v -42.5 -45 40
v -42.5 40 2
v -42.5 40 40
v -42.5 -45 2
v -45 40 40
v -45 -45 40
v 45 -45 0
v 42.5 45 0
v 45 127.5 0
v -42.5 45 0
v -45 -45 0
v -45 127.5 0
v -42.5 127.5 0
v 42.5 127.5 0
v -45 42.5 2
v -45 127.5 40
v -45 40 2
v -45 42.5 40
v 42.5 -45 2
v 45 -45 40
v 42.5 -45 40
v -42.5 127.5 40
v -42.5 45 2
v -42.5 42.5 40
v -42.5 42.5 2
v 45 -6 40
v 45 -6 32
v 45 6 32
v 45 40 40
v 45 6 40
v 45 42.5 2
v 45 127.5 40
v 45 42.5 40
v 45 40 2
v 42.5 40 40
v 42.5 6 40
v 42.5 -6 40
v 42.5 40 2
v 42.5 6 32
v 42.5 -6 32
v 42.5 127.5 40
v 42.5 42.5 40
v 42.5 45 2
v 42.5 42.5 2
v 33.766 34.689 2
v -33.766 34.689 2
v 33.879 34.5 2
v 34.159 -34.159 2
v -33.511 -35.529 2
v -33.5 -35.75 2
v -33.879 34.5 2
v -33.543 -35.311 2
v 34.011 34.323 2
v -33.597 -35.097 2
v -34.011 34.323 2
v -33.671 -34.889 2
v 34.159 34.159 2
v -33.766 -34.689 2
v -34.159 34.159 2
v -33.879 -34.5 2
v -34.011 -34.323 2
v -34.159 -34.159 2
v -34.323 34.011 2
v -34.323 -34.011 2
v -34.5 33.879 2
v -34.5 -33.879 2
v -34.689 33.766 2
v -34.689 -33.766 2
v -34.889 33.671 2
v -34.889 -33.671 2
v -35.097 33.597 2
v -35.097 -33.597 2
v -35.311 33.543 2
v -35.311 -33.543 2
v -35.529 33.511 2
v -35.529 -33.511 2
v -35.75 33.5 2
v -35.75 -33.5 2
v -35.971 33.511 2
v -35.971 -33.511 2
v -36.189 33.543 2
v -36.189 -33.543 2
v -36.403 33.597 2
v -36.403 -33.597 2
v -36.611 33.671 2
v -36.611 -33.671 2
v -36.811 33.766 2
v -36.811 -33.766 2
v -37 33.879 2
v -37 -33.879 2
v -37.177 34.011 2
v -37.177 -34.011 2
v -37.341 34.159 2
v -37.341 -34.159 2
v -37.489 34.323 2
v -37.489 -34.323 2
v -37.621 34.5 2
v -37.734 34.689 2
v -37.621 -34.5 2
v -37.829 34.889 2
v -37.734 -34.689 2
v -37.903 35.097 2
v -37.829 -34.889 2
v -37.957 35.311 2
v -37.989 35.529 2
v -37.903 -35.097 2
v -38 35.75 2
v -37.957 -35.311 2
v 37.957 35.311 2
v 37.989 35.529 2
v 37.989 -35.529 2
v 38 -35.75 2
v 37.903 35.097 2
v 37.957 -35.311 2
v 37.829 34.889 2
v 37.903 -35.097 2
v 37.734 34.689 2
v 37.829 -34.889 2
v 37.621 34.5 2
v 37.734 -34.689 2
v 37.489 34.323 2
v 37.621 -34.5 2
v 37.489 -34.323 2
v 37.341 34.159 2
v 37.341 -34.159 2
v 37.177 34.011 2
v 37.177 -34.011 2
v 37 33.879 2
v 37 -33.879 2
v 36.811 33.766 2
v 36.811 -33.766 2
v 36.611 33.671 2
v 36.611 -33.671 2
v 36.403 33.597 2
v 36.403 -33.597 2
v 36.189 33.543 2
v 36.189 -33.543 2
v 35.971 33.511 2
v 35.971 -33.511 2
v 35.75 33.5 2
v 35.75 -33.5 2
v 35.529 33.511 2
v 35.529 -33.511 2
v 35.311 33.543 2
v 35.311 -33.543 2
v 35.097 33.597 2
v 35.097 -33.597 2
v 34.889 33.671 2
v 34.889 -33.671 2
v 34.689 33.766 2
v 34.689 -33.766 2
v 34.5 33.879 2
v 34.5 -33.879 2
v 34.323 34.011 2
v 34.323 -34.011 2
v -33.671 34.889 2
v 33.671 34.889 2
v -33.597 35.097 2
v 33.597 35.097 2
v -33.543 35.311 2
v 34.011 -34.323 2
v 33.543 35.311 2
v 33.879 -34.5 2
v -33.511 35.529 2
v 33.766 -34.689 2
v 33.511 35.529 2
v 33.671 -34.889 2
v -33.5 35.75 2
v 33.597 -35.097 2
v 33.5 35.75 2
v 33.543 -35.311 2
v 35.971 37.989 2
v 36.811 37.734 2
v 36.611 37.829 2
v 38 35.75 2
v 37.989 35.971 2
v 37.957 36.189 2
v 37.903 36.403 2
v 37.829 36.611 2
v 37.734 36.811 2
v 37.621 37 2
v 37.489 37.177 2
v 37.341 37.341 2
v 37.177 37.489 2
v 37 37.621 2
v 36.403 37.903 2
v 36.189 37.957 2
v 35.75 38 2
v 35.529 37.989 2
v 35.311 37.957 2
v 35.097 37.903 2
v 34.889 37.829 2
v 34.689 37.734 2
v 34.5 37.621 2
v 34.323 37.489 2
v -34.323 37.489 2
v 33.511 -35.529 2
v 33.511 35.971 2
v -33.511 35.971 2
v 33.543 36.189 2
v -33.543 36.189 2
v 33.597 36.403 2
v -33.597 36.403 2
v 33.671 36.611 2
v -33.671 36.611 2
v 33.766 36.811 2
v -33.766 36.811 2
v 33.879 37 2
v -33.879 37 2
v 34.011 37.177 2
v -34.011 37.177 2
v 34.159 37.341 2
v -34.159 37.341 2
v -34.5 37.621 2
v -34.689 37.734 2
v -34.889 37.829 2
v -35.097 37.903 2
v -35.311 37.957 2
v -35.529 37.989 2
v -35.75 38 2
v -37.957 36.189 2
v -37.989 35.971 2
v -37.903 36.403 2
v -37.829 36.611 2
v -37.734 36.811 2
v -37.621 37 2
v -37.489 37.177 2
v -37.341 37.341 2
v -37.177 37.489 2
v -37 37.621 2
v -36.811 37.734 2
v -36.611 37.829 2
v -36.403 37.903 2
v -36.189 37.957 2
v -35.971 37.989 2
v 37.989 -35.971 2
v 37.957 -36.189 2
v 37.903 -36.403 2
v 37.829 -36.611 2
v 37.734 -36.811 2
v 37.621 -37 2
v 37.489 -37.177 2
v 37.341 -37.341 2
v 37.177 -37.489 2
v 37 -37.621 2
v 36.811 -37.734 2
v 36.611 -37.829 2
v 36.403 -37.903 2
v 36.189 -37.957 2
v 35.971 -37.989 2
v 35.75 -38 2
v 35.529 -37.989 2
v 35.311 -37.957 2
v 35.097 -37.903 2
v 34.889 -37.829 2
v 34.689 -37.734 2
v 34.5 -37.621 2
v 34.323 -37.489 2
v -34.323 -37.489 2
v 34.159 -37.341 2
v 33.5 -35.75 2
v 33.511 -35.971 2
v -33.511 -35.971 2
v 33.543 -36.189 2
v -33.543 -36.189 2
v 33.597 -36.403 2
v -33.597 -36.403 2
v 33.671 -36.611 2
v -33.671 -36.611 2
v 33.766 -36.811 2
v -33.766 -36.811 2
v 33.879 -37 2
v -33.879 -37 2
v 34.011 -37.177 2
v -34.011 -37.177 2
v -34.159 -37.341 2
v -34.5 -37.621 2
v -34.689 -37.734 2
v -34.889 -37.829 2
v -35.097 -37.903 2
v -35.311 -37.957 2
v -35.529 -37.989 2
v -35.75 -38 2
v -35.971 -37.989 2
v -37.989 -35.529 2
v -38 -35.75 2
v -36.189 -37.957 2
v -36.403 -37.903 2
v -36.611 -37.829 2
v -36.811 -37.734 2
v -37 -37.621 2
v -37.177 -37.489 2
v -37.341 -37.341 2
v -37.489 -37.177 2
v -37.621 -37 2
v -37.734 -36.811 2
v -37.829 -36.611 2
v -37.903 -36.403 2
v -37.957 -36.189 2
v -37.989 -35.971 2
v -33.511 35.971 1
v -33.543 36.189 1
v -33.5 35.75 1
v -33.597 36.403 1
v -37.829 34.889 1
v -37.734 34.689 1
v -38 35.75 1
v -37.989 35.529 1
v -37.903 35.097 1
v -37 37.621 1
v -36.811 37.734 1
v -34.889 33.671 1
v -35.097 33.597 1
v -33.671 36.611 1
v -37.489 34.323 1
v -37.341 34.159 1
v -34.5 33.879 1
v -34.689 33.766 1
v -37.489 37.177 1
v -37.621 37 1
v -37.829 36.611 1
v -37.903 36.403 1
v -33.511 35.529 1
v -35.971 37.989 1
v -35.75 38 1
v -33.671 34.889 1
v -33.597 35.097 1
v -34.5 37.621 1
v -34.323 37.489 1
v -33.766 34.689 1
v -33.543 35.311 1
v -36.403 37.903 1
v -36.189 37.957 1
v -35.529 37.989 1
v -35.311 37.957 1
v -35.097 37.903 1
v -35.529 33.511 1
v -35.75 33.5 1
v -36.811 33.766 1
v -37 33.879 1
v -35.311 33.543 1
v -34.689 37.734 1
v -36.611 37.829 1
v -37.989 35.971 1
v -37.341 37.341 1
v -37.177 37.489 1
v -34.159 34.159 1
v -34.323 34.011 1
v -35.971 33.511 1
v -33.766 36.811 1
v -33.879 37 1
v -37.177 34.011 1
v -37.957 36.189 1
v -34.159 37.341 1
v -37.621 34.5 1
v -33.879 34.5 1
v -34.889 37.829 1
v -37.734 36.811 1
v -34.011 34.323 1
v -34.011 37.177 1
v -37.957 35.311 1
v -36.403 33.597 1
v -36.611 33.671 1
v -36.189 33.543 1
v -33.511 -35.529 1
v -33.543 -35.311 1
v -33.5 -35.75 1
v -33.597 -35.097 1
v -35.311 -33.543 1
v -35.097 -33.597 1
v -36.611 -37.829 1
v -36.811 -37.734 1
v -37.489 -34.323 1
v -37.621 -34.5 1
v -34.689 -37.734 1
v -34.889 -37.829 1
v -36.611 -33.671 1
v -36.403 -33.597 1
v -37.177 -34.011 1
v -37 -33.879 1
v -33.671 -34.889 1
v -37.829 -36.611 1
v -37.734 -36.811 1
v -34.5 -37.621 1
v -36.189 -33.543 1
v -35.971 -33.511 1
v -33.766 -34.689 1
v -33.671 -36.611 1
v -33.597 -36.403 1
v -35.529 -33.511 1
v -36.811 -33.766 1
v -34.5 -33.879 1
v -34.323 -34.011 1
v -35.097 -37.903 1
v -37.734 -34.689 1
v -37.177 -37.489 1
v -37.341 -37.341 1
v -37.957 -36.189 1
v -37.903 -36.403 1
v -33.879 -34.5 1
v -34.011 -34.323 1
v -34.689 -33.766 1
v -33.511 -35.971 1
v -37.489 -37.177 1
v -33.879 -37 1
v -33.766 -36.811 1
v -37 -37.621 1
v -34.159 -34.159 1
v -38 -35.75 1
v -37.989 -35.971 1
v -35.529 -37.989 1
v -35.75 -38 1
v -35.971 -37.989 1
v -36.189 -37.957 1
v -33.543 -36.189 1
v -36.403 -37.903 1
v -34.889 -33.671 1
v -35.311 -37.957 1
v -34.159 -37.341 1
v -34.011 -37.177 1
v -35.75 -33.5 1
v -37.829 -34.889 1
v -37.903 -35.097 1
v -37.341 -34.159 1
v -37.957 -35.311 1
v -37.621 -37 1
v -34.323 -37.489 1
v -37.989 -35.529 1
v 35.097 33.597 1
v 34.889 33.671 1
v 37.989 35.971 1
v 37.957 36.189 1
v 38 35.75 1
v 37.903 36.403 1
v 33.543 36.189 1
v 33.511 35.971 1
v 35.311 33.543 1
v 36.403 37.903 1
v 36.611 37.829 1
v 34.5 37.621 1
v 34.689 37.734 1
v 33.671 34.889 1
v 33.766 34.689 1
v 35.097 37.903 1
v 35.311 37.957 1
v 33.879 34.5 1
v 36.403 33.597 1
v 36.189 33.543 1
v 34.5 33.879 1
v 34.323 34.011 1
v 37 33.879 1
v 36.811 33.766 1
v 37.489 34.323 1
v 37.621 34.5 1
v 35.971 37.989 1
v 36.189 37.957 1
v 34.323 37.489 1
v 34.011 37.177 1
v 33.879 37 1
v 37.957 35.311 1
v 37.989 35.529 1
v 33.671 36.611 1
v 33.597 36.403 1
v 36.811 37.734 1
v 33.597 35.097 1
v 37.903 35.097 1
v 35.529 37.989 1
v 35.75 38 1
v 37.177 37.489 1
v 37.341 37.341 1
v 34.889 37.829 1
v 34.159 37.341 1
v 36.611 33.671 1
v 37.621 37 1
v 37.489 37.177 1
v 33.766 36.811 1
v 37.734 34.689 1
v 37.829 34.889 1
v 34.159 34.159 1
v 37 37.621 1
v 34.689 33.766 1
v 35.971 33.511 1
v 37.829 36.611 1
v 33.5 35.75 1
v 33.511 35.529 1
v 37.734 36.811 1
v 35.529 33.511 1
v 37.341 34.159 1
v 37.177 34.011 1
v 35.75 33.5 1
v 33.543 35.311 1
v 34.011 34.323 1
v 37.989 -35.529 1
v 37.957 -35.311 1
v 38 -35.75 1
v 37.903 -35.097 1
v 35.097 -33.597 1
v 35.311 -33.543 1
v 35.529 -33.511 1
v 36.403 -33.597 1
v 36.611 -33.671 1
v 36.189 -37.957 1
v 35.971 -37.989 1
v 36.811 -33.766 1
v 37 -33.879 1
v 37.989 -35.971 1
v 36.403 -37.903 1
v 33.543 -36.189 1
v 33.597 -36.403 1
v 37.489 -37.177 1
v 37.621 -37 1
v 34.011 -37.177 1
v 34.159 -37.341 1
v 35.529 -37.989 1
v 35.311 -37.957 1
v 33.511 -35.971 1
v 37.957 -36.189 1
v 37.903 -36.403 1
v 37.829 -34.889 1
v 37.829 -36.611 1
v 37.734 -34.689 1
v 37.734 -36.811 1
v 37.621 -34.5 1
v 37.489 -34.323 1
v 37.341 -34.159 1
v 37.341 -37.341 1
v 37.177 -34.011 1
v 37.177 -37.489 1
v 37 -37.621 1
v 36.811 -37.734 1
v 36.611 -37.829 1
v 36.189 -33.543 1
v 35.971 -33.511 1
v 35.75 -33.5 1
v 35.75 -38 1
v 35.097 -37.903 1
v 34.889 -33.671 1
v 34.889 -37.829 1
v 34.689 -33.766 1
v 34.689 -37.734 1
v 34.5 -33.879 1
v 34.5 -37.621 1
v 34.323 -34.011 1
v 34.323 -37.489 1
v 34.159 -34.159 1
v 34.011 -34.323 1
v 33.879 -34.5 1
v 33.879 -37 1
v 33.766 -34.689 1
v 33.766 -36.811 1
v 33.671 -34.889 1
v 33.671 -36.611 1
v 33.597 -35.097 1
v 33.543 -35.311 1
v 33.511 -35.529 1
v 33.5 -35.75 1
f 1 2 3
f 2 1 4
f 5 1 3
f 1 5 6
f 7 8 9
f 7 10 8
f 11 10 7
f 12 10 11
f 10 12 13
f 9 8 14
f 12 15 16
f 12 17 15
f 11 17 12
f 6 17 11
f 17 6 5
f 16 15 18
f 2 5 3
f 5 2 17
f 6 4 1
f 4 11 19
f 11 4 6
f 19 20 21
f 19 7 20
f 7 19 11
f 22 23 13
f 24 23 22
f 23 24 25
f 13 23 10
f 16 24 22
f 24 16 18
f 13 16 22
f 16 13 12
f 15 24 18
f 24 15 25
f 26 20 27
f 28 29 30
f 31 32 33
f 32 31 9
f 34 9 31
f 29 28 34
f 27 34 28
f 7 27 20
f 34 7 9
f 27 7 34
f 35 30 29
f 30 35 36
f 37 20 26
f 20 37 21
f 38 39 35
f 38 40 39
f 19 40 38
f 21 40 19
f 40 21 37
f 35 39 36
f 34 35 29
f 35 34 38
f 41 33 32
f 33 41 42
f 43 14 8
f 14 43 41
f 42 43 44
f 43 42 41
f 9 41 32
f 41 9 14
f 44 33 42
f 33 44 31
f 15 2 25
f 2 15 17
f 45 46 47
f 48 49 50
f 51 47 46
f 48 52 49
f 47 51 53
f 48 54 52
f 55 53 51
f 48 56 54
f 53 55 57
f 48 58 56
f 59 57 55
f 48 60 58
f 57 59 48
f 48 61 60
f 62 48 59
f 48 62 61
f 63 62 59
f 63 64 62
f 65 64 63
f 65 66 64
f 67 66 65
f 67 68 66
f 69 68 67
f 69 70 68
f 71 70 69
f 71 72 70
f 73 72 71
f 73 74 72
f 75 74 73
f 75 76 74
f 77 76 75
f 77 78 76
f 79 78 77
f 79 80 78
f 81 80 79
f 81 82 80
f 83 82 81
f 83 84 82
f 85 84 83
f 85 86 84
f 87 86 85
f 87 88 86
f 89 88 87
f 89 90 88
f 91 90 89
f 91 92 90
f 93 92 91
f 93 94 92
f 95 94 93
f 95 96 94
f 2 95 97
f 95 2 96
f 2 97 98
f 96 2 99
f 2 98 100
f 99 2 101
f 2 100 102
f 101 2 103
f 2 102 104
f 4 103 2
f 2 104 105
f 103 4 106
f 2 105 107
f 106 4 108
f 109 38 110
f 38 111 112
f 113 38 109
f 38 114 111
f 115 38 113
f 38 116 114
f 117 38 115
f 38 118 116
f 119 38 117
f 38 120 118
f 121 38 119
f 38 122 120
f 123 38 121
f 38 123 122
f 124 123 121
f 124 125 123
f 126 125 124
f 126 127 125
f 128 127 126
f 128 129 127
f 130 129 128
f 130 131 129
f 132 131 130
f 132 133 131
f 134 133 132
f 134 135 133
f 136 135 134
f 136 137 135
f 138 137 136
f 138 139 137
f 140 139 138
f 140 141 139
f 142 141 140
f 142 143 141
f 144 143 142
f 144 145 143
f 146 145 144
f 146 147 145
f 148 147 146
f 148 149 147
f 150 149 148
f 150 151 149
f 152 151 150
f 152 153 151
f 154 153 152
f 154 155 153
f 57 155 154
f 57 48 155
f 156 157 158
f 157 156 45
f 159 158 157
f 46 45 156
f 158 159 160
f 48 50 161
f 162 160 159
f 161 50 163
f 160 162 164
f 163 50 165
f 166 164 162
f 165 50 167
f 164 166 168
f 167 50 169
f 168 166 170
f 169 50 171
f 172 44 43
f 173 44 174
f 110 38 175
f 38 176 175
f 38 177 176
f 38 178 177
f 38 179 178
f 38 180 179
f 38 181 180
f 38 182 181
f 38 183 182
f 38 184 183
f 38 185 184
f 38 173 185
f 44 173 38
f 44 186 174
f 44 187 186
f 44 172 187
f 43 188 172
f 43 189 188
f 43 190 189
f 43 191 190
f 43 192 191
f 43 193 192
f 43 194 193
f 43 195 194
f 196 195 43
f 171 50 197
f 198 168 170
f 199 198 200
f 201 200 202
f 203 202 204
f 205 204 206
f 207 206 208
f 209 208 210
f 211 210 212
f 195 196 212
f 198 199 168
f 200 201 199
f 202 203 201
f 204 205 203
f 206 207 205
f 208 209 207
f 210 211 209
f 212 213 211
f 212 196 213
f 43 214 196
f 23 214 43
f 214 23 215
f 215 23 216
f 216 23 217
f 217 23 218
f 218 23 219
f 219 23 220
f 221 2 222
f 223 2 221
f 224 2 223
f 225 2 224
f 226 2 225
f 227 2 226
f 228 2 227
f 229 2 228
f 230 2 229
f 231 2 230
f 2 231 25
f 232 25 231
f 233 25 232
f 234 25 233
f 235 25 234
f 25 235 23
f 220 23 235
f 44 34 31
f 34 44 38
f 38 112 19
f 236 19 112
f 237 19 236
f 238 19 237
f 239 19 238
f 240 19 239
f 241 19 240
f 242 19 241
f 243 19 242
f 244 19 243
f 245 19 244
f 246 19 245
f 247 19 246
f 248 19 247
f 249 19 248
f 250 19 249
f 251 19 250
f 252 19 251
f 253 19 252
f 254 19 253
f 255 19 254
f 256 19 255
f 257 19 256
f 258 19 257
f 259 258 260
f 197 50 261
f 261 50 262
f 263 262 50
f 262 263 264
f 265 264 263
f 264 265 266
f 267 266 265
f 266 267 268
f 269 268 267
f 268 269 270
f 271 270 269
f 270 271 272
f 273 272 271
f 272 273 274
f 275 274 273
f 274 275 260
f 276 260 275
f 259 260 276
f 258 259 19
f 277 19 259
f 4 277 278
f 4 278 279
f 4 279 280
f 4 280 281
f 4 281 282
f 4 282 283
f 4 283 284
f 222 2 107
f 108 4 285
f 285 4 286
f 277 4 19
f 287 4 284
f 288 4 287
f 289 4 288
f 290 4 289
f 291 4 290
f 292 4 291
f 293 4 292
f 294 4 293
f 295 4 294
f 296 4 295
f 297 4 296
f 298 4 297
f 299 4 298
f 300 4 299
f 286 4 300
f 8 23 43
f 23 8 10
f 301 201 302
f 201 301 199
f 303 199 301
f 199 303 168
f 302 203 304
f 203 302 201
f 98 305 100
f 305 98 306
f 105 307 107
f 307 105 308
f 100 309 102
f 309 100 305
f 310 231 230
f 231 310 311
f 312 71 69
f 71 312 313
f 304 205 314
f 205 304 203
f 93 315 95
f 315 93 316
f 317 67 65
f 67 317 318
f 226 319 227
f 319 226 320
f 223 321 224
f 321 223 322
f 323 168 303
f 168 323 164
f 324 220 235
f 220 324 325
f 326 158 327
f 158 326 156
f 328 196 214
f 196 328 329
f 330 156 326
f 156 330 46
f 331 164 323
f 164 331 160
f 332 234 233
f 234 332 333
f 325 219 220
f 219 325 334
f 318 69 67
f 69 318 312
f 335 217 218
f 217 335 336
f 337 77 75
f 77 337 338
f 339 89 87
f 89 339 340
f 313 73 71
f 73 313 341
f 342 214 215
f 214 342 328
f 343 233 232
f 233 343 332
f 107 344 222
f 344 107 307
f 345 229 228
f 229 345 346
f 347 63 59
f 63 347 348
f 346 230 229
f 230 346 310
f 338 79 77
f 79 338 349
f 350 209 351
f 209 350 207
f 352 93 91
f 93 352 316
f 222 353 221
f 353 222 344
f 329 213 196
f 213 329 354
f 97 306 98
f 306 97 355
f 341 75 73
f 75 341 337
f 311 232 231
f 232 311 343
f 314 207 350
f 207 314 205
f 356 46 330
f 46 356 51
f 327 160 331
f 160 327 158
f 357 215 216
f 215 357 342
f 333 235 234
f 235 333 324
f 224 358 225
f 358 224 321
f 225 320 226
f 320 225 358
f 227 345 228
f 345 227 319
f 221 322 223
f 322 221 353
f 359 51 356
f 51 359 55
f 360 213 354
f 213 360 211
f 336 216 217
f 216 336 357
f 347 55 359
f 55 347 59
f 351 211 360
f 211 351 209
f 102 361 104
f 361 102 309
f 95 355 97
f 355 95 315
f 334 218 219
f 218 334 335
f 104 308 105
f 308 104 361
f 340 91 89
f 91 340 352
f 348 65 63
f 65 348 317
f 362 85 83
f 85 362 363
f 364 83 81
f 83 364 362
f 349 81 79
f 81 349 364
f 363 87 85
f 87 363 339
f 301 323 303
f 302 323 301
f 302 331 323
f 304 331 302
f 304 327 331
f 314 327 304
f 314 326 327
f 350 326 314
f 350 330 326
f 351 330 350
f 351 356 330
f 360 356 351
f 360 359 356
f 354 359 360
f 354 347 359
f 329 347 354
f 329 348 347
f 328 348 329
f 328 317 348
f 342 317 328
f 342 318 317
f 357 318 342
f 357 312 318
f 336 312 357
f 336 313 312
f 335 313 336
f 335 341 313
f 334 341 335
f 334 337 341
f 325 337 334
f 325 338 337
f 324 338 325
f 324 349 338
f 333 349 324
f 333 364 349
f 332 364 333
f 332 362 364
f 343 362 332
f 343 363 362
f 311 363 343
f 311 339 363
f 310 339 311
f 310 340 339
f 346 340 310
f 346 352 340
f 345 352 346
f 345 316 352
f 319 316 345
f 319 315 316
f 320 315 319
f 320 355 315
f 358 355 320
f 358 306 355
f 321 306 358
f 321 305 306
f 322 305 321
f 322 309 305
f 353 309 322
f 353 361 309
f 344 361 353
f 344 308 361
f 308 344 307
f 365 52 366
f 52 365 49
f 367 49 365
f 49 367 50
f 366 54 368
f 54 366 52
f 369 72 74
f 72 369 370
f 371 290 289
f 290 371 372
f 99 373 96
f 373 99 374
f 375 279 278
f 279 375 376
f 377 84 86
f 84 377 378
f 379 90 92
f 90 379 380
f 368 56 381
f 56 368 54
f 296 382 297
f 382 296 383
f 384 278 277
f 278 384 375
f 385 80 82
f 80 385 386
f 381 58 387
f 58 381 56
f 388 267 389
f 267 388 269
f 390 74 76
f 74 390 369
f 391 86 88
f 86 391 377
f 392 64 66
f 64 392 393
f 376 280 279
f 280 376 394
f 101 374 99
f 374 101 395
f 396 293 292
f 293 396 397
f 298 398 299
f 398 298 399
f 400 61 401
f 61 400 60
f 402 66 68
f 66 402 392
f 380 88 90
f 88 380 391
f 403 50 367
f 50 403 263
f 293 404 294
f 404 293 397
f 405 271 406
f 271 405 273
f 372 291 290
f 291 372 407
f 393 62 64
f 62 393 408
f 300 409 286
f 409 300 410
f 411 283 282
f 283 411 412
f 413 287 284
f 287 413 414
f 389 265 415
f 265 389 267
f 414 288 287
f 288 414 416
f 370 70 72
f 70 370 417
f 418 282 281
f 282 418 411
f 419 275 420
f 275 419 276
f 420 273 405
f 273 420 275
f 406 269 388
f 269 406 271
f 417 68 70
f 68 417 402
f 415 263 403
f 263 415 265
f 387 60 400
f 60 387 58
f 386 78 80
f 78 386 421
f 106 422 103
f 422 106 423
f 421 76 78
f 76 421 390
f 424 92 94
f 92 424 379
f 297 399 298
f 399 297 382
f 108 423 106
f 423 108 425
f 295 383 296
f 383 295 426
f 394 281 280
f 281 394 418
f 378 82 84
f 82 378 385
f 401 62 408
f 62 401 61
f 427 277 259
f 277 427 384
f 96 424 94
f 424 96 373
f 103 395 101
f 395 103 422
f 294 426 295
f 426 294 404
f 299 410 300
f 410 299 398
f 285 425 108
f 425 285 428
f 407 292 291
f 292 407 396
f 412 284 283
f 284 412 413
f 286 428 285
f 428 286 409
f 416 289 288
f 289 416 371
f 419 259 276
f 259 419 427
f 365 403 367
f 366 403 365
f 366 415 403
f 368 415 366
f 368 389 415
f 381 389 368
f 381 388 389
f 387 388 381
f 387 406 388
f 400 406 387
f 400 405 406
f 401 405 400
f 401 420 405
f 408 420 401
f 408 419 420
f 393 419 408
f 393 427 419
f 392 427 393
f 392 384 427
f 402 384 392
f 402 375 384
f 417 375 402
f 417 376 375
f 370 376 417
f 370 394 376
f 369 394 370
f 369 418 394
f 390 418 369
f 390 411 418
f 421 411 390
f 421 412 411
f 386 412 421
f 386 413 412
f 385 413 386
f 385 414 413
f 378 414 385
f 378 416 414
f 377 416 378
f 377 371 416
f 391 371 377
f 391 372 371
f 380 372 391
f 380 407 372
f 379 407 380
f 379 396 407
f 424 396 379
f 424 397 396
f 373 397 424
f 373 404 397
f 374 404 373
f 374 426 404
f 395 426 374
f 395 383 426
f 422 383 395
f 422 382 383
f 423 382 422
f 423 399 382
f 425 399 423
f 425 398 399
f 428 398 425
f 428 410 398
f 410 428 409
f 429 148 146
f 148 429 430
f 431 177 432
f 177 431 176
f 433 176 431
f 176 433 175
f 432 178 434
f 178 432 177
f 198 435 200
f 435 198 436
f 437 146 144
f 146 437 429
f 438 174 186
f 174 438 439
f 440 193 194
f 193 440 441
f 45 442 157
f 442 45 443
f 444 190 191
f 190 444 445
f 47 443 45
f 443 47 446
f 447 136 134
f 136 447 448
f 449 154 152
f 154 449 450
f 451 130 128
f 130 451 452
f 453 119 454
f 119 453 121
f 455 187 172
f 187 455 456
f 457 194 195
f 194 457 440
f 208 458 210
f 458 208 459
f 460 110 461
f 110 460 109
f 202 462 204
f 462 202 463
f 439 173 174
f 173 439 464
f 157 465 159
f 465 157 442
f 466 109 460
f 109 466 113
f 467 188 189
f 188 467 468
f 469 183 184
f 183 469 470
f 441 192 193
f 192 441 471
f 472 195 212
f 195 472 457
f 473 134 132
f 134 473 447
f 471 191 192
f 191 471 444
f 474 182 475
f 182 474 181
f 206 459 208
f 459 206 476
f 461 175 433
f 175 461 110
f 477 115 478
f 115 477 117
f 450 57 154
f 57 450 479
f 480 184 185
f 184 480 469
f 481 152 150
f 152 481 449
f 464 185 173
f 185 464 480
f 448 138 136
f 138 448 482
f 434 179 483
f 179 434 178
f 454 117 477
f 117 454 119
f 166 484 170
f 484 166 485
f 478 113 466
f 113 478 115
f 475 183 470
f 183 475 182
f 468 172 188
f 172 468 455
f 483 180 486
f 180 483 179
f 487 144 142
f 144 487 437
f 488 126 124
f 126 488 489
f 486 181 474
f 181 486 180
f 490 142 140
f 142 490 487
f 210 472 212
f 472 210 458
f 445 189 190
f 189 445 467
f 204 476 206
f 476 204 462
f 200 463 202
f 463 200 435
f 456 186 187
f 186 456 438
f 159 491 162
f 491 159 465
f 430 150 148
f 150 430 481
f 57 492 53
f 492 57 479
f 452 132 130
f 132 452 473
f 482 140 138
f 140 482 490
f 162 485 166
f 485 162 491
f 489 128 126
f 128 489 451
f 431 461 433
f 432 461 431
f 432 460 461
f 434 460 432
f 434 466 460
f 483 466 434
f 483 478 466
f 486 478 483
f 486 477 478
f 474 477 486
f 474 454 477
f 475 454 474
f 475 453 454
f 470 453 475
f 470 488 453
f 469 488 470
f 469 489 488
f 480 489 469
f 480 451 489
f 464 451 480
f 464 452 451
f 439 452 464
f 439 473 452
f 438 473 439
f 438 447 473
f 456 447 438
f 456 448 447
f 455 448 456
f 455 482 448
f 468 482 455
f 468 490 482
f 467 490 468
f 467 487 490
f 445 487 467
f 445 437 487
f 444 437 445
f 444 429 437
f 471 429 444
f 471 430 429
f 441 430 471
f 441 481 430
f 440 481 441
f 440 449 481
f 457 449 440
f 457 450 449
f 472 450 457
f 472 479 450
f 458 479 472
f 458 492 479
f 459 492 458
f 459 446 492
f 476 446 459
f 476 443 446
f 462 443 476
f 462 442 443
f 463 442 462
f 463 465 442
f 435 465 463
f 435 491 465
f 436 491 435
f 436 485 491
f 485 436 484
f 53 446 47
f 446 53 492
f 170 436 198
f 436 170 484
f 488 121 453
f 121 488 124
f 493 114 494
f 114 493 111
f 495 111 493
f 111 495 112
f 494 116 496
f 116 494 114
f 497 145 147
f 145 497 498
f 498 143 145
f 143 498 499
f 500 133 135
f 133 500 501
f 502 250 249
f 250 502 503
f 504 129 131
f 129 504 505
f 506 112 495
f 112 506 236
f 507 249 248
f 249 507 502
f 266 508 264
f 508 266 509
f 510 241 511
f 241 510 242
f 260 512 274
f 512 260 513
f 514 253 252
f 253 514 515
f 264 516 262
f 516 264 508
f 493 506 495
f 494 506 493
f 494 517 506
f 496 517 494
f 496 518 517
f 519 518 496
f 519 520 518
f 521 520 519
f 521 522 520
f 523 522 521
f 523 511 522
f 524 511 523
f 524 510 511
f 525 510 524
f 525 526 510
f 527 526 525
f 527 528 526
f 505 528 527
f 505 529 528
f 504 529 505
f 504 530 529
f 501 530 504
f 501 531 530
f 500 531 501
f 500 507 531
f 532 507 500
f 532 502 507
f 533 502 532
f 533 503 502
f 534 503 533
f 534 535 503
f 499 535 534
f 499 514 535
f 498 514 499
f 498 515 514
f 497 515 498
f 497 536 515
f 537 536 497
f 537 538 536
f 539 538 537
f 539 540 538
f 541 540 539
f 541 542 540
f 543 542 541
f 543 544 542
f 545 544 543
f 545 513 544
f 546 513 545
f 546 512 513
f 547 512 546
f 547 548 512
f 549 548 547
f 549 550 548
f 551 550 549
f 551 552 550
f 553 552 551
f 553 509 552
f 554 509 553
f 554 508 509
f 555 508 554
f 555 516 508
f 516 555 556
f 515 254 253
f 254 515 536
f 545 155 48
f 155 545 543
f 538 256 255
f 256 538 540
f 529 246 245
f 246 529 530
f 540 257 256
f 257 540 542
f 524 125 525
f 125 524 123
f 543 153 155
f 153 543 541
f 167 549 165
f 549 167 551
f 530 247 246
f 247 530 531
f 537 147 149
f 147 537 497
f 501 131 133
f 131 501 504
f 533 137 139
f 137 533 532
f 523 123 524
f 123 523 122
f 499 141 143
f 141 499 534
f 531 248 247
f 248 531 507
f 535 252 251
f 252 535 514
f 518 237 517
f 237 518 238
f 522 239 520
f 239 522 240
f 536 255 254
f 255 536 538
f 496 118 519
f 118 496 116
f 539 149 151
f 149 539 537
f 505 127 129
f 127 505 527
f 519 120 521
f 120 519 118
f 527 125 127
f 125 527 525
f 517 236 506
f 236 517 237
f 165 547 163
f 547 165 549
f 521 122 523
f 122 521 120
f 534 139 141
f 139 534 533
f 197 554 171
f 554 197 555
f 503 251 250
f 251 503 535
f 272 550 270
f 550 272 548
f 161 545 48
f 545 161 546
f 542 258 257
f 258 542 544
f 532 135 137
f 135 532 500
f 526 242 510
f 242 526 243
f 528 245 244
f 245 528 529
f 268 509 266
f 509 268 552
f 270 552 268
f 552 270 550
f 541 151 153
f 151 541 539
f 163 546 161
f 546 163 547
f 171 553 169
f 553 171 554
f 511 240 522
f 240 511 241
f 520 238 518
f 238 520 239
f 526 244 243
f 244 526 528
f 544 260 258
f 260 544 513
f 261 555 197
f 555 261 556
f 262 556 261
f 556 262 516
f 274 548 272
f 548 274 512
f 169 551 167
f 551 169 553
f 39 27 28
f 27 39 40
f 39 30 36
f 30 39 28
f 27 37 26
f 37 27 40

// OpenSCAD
// Magnetic stirrer housing - upside-down open box over a 80 mm PC fan
// Print orientation: closed top plate on the bed (z = 0), walls rise to z = 40

// ---------------- Parameters ----------------
plate_t      = 2;     // top plate thickness (mm)
wall_t       = 2.5;   // wall thickness (mm)
box_h        = 40;    // outer height of walls (mm)
outer_w      = 90;    // outer size in X and Y (mm)
hole_d       = 4.5;   // M4 screw hole diameter (mm)
hole_pitch   = 71.5;  // square pattern pitch of screw holes (mm)
notch_w      = 12;    // cable notch width (mm)
notch_bottom = 8;     // notch depth from open edge (mm), i.e. z = 32 to 40
eps          = 0.5;   // cutter overshoot past faces (mm)

$fn = 64;

// ---------------- Model ----------------
difference() {
    // Main box body
    union() {
        // Top plate (closed top, fan facing down)
        translate([-outer_w/2, -outer_w/2, 0])
            cube([outer_w, outer_w, plate_t]);

        // Four walls rising from the plate to z = box_h
        for (sx = [-1, 1], sy = [-1, 1])
            translate([sx > 0 ? outer_w/2 - wall_t : -outer_w/2,
                       sy > 0 ? outer_w/2 - wall_t : -outer_w/2,
                       0])
                cube([wall_t, outer_w - 2*wall_t, box_h]);
    }

    // Four M4 screw holes through the top plate, centred on the plate
    for (i = [0 : 3])
        translate([(i < 2 ? -hole_pitch/2 : hole_pitch/2),
                   (i % 2 ? -hole_pitch/2 : hole_pitch/2),
                   plate_t/2])
            cylinder(d = hole_d, h = plate_t + eps);

    // Cable notch in one wall, centred along the wall, z = 32 to 40
    translate([0, -notch_w/2, box_h - notch_bottom])
        cube([outer_w - 2*wall_t, notch_w, notch_bottom + eps]);
}
